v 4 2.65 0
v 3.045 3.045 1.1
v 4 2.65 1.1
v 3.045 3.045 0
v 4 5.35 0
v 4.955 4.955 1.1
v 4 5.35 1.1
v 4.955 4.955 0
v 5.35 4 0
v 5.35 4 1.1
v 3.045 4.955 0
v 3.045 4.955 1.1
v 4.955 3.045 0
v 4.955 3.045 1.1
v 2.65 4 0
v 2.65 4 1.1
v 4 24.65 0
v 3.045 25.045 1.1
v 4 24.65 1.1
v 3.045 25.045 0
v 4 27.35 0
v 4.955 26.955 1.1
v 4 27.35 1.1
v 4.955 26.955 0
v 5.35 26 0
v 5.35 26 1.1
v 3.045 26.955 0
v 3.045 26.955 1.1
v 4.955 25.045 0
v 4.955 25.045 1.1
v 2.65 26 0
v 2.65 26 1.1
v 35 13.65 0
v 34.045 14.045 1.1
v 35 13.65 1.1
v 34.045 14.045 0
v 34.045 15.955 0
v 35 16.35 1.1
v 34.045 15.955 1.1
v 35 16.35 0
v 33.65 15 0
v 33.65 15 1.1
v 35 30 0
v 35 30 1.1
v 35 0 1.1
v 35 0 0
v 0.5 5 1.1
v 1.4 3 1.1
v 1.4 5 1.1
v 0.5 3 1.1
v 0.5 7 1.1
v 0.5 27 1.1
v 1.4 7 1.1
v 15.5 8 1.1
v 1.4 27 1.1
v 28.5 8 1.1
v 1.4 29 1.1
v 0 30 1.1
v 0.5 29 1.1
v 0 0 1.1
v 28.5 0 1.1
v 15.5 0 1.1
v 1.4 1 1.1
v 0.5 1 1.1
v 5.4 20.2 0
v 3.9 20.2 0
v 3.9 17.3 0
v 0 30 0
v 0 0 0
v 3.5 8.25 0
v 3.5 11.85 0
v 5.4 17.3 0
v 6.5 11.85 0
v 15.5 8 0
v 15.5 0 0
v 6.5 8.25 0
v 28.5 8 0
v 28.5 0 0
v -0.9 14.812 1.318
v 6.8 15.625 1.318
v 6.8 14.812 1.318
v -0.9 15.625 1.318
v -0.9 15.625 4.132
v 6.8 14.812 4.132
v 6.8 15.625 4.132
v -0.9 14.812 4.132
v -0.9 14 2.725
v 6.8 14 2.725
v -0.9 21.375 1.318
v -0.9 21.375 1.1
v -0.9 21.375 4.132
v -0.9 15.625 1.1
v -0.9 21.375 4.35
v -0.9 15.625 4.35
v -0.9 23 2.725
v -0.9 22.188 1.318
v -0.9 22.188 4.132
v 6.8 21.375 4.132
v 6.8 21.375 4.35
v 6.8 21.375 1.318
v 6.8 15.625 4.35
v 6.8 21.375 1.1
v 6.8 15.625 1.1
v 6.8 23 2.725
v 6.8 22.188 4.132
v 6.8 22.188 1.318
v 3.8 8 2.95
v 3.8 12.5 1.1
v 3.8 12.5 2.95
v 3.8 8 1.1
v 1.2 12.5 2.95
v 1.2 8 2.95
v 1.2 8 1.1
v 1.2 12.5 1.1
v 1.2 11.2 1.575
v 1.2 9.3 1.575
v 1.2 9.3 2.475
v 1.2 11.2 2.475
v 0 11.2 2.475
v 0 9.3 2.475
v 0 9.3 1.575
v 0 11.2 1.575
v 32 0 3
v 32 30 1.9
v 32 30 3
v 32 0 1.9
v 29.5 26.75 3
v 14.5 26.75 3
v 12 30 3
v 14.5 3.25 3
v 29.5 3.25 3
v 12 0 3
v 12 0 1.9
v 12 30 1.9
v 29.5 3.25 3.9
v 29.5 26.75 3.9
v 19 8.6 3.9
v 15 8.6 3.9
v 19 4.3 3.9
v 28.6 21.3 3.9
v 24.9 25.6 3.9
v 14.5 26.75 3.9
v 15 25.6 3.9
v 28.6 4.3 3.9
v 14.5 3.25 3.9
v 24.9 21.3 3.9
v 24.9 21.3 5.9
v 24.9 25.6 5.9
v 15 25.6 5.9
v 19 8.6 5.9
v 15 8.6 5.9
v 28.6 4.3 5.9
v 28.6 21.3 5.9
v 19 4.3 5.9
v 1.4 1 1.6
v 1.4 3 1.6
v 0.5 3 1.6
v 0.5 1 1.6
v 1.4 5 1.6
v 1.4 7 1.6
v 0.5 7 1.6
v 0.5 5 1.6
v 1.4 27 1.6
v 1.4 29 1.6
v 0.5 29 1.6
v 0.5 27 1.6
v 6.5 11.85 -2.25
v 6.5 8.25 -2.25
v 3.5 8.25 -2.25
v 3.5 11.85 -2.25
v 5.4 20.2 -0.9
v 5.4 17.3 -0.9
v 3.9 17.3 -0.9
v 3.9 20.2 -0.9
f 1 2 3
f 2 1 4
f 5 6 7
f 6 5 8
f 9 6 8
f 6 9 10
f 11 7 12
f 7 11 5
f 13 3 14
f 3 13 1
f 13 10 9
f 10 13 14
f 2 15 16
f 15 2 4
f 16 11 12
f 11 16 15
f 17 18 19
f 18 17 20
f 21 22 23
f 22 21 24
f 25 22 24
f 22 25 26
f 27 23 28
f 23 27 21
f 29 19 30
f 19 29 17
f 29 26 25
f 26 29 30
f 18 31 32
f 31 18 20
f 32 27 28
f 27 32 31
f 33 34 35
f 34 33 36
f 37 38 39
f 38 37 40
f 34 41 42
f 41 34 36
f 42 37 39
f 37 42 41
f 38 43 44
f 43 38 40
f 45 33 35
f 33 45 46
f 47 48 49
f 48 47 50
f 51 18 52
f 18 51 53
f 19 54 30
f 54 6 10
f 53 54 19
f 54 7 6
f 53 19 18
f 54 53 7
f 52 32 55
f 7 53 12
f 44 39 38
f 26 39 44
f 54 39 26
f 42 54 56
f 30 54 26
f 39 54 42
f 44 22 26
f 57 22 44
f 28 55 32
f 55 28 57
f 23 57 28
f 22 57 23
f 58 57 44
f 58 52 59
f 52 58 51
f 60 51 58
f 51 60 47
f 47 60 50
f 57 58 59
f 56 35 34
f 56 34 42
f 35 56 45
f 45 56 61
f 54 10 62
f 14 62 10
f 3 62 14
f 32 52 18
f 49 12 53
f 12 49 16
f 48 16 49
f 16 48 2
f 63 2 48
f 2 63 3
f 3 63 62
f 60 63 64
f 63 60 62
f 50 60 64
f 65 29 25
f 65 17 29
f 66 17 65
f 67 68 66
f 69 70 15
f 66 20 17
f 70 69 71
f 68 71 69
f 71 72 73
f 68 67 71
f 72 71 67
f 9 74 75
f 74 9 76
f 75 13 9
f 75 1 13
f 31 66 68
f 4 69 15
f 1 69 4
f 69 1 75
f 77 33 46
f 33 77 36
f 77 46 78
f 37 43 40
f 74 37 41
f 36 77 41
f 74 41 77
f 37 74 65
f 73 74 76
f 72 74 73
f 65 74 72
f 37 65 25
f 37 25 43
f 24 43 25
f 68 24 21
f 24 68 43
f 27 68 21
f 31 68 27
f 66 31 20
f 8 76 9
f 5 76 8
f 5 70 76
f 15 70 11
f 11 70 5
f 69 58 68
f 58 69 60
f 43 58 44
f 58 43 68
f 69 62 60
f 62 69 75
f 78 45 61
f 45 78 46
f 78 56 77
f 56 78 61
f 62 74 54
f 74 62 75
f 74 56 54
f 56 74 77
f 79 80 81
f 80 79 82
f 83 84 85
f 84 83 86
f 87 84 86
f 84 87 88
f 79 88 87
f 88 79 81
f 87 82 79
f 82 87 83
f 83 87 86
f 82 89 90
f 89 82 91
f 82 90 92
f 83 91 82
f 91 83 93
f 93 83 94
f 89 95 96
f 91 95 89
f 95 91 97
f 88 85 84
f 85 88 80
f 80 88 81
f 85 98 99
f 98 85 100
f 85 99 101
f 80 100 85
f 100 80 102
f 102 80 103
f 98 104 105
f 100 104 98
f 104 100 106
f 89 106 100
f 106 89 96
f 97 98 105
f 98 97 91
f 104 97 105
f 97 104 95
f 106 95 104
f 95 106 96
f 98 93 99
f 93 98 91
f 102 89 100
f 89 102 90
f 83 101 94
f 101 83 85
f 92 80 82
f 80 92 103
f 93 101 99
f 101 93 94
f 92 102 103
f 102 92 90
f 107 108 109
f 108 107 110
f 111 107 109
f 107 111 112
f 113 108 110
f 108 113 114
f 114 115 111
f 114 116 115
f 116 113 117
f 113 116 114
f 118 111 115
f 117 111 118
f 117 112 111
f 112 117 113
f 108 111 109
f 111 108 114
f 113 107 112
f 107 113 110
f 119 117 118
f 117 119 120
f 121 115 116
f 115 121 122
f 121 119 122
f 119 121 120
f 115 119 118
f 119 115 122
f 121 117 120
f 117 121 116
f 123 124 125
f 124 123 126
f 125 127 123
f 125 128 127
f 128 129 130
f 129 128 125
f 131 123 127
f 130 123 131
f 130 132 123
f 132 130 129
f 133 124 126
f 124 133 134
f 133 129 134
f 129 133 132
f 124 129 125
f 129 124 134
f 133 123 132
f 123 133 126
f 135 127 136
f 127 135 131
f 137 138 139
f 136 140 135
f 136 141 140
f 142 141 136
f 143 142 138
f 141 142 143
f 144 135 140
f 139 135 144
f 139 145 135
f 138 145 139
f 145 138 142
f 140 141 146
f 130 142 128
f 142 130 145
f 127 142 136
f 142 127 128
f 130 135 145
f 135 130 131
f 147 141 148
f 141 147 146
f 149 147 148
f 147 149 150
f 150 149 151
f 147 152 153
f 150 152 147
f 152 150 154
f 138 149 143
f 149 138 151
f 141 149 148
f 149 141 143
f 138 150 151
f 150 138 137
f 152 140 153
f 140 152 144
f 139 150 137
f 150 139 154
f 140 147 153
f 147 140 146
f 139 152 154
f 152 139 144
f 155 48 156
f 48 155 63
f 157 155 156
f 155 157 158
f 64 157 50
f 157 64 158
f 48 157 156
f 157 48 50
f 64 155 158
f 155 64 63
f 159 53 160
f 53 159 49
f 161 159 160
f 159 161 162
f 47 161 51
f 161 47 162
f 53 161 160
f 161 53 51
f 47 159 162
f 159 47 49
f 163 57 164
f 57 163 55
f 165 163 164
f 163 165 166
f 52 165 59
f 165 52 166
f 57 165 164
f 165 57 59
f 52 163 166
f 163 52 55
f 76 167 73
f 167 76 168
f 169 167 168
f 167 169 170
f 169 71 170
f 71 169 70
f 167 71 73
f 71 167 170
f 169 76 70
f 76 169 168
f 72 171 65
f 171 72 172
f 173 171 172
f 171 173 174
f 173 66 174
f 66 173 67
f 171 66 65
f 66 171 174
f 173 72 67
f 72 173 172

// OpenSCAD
module rak19003_mounting_holes(diameter=2.70, h=5, includePartial=true) {
	positions = [
		[4.00, 4.00],
		[4.00, 26.00],
		/* [35.00, 15.00], */
	];
	for (position = positions) {
		translate(position) {
			cylinder(d=diameter, h=h);
		}
	}
	if (includePartial) {
		translate([35, 15]) {
			cylinder(d=diameter, h=h);
		}
	}
}

module rak19003_board() {
	thickness = 1.1;
	e = 0.1;
	difference() {
		color("#555555")
			cube([35, 30, thickness]); // TODO: verify board thickness
		
		translate([15.5, 0-e, -1*e])
		cube([28.5-15.5, 8+e, thickness+(2*e)]);
		translate([0,0,-0.1]) rak19003_mounting_holes($fn=8);
	}


	translate([-0.9, 14, thickness]) usb_c_port();
	translate([0, 8, thickness]) reset_button();
	translate([0.5, 1, thickness]) led();
	translate([0.5, 5, thickness]) led();
	translate([0.5, 27, thickness]) led(); // charging led (TODO: placement)
	
	// various large components
	color("#CC9900")
		translate([3.5, 8.25, -2.25])
		cube([3, 3.6, 2.25]);
	color("#333333")
		translate([3.9, 17.3, -0.9])
		cube([1.5, 2.9, 0.9]);
		
	translate([12, 0, thickness + 0.8]) rak_core_board();
}

module rak_core_board() {
	color("#555555")
		cube([20, 30, 1.1]);
	color("#119933")
	translate([2.5, (30-23.5)/2, 1.1])
		cube([15, 23.5, 0.9]);
	color("#CCCCCC")
	translate([3, 8.6, 2])
		cube([9.9, 17, 2]);
	color("#CCCCCC")
	translate([7, 4.3, 2])
		cube([9.6, 17, 2]);
}

module usb_c_port() {
	color("#CCCCCC")
		usb_c();
		/* cube([7.7, 9.0, 3.25]); */
}

module usb_c(width=9, h=3.25, depth=7.7) {
	thickness=h;
	r=thickness/2;
	rotate([90, 0, 90]) {
		translate([r, r, 0])
			cylinder(r=r, h=depth);
		translate([width-r, r, 0])
		cylinder(r=r, h=depth);
		translate([r, 0, 0])
			cube([width-thickness, thickness, depth]);
	}
}



module reset_button() {
	majThickness = 1.85;
	btnThickness = 0.9;
	majWidth = 4.5;
	btnWidth = 1.9;
	btnProud = 1.2;
	color("#FFEEEE") // cream color in hex
		translate([btnProud, 0, 0])
		cube([2.6, majWidth, majThickness]);
	color("#777777")
		translate([0, (majWidth - btnWidth)/2, (majThickness - btnThickness)/2])
		cube([btnProud, btnWidth, btnThickness]);
}

module led() {
	cube([0.9, 2, 0.5]);
}

module rak19003_model() {
	rak19003_board();

}

rak19003_model();
